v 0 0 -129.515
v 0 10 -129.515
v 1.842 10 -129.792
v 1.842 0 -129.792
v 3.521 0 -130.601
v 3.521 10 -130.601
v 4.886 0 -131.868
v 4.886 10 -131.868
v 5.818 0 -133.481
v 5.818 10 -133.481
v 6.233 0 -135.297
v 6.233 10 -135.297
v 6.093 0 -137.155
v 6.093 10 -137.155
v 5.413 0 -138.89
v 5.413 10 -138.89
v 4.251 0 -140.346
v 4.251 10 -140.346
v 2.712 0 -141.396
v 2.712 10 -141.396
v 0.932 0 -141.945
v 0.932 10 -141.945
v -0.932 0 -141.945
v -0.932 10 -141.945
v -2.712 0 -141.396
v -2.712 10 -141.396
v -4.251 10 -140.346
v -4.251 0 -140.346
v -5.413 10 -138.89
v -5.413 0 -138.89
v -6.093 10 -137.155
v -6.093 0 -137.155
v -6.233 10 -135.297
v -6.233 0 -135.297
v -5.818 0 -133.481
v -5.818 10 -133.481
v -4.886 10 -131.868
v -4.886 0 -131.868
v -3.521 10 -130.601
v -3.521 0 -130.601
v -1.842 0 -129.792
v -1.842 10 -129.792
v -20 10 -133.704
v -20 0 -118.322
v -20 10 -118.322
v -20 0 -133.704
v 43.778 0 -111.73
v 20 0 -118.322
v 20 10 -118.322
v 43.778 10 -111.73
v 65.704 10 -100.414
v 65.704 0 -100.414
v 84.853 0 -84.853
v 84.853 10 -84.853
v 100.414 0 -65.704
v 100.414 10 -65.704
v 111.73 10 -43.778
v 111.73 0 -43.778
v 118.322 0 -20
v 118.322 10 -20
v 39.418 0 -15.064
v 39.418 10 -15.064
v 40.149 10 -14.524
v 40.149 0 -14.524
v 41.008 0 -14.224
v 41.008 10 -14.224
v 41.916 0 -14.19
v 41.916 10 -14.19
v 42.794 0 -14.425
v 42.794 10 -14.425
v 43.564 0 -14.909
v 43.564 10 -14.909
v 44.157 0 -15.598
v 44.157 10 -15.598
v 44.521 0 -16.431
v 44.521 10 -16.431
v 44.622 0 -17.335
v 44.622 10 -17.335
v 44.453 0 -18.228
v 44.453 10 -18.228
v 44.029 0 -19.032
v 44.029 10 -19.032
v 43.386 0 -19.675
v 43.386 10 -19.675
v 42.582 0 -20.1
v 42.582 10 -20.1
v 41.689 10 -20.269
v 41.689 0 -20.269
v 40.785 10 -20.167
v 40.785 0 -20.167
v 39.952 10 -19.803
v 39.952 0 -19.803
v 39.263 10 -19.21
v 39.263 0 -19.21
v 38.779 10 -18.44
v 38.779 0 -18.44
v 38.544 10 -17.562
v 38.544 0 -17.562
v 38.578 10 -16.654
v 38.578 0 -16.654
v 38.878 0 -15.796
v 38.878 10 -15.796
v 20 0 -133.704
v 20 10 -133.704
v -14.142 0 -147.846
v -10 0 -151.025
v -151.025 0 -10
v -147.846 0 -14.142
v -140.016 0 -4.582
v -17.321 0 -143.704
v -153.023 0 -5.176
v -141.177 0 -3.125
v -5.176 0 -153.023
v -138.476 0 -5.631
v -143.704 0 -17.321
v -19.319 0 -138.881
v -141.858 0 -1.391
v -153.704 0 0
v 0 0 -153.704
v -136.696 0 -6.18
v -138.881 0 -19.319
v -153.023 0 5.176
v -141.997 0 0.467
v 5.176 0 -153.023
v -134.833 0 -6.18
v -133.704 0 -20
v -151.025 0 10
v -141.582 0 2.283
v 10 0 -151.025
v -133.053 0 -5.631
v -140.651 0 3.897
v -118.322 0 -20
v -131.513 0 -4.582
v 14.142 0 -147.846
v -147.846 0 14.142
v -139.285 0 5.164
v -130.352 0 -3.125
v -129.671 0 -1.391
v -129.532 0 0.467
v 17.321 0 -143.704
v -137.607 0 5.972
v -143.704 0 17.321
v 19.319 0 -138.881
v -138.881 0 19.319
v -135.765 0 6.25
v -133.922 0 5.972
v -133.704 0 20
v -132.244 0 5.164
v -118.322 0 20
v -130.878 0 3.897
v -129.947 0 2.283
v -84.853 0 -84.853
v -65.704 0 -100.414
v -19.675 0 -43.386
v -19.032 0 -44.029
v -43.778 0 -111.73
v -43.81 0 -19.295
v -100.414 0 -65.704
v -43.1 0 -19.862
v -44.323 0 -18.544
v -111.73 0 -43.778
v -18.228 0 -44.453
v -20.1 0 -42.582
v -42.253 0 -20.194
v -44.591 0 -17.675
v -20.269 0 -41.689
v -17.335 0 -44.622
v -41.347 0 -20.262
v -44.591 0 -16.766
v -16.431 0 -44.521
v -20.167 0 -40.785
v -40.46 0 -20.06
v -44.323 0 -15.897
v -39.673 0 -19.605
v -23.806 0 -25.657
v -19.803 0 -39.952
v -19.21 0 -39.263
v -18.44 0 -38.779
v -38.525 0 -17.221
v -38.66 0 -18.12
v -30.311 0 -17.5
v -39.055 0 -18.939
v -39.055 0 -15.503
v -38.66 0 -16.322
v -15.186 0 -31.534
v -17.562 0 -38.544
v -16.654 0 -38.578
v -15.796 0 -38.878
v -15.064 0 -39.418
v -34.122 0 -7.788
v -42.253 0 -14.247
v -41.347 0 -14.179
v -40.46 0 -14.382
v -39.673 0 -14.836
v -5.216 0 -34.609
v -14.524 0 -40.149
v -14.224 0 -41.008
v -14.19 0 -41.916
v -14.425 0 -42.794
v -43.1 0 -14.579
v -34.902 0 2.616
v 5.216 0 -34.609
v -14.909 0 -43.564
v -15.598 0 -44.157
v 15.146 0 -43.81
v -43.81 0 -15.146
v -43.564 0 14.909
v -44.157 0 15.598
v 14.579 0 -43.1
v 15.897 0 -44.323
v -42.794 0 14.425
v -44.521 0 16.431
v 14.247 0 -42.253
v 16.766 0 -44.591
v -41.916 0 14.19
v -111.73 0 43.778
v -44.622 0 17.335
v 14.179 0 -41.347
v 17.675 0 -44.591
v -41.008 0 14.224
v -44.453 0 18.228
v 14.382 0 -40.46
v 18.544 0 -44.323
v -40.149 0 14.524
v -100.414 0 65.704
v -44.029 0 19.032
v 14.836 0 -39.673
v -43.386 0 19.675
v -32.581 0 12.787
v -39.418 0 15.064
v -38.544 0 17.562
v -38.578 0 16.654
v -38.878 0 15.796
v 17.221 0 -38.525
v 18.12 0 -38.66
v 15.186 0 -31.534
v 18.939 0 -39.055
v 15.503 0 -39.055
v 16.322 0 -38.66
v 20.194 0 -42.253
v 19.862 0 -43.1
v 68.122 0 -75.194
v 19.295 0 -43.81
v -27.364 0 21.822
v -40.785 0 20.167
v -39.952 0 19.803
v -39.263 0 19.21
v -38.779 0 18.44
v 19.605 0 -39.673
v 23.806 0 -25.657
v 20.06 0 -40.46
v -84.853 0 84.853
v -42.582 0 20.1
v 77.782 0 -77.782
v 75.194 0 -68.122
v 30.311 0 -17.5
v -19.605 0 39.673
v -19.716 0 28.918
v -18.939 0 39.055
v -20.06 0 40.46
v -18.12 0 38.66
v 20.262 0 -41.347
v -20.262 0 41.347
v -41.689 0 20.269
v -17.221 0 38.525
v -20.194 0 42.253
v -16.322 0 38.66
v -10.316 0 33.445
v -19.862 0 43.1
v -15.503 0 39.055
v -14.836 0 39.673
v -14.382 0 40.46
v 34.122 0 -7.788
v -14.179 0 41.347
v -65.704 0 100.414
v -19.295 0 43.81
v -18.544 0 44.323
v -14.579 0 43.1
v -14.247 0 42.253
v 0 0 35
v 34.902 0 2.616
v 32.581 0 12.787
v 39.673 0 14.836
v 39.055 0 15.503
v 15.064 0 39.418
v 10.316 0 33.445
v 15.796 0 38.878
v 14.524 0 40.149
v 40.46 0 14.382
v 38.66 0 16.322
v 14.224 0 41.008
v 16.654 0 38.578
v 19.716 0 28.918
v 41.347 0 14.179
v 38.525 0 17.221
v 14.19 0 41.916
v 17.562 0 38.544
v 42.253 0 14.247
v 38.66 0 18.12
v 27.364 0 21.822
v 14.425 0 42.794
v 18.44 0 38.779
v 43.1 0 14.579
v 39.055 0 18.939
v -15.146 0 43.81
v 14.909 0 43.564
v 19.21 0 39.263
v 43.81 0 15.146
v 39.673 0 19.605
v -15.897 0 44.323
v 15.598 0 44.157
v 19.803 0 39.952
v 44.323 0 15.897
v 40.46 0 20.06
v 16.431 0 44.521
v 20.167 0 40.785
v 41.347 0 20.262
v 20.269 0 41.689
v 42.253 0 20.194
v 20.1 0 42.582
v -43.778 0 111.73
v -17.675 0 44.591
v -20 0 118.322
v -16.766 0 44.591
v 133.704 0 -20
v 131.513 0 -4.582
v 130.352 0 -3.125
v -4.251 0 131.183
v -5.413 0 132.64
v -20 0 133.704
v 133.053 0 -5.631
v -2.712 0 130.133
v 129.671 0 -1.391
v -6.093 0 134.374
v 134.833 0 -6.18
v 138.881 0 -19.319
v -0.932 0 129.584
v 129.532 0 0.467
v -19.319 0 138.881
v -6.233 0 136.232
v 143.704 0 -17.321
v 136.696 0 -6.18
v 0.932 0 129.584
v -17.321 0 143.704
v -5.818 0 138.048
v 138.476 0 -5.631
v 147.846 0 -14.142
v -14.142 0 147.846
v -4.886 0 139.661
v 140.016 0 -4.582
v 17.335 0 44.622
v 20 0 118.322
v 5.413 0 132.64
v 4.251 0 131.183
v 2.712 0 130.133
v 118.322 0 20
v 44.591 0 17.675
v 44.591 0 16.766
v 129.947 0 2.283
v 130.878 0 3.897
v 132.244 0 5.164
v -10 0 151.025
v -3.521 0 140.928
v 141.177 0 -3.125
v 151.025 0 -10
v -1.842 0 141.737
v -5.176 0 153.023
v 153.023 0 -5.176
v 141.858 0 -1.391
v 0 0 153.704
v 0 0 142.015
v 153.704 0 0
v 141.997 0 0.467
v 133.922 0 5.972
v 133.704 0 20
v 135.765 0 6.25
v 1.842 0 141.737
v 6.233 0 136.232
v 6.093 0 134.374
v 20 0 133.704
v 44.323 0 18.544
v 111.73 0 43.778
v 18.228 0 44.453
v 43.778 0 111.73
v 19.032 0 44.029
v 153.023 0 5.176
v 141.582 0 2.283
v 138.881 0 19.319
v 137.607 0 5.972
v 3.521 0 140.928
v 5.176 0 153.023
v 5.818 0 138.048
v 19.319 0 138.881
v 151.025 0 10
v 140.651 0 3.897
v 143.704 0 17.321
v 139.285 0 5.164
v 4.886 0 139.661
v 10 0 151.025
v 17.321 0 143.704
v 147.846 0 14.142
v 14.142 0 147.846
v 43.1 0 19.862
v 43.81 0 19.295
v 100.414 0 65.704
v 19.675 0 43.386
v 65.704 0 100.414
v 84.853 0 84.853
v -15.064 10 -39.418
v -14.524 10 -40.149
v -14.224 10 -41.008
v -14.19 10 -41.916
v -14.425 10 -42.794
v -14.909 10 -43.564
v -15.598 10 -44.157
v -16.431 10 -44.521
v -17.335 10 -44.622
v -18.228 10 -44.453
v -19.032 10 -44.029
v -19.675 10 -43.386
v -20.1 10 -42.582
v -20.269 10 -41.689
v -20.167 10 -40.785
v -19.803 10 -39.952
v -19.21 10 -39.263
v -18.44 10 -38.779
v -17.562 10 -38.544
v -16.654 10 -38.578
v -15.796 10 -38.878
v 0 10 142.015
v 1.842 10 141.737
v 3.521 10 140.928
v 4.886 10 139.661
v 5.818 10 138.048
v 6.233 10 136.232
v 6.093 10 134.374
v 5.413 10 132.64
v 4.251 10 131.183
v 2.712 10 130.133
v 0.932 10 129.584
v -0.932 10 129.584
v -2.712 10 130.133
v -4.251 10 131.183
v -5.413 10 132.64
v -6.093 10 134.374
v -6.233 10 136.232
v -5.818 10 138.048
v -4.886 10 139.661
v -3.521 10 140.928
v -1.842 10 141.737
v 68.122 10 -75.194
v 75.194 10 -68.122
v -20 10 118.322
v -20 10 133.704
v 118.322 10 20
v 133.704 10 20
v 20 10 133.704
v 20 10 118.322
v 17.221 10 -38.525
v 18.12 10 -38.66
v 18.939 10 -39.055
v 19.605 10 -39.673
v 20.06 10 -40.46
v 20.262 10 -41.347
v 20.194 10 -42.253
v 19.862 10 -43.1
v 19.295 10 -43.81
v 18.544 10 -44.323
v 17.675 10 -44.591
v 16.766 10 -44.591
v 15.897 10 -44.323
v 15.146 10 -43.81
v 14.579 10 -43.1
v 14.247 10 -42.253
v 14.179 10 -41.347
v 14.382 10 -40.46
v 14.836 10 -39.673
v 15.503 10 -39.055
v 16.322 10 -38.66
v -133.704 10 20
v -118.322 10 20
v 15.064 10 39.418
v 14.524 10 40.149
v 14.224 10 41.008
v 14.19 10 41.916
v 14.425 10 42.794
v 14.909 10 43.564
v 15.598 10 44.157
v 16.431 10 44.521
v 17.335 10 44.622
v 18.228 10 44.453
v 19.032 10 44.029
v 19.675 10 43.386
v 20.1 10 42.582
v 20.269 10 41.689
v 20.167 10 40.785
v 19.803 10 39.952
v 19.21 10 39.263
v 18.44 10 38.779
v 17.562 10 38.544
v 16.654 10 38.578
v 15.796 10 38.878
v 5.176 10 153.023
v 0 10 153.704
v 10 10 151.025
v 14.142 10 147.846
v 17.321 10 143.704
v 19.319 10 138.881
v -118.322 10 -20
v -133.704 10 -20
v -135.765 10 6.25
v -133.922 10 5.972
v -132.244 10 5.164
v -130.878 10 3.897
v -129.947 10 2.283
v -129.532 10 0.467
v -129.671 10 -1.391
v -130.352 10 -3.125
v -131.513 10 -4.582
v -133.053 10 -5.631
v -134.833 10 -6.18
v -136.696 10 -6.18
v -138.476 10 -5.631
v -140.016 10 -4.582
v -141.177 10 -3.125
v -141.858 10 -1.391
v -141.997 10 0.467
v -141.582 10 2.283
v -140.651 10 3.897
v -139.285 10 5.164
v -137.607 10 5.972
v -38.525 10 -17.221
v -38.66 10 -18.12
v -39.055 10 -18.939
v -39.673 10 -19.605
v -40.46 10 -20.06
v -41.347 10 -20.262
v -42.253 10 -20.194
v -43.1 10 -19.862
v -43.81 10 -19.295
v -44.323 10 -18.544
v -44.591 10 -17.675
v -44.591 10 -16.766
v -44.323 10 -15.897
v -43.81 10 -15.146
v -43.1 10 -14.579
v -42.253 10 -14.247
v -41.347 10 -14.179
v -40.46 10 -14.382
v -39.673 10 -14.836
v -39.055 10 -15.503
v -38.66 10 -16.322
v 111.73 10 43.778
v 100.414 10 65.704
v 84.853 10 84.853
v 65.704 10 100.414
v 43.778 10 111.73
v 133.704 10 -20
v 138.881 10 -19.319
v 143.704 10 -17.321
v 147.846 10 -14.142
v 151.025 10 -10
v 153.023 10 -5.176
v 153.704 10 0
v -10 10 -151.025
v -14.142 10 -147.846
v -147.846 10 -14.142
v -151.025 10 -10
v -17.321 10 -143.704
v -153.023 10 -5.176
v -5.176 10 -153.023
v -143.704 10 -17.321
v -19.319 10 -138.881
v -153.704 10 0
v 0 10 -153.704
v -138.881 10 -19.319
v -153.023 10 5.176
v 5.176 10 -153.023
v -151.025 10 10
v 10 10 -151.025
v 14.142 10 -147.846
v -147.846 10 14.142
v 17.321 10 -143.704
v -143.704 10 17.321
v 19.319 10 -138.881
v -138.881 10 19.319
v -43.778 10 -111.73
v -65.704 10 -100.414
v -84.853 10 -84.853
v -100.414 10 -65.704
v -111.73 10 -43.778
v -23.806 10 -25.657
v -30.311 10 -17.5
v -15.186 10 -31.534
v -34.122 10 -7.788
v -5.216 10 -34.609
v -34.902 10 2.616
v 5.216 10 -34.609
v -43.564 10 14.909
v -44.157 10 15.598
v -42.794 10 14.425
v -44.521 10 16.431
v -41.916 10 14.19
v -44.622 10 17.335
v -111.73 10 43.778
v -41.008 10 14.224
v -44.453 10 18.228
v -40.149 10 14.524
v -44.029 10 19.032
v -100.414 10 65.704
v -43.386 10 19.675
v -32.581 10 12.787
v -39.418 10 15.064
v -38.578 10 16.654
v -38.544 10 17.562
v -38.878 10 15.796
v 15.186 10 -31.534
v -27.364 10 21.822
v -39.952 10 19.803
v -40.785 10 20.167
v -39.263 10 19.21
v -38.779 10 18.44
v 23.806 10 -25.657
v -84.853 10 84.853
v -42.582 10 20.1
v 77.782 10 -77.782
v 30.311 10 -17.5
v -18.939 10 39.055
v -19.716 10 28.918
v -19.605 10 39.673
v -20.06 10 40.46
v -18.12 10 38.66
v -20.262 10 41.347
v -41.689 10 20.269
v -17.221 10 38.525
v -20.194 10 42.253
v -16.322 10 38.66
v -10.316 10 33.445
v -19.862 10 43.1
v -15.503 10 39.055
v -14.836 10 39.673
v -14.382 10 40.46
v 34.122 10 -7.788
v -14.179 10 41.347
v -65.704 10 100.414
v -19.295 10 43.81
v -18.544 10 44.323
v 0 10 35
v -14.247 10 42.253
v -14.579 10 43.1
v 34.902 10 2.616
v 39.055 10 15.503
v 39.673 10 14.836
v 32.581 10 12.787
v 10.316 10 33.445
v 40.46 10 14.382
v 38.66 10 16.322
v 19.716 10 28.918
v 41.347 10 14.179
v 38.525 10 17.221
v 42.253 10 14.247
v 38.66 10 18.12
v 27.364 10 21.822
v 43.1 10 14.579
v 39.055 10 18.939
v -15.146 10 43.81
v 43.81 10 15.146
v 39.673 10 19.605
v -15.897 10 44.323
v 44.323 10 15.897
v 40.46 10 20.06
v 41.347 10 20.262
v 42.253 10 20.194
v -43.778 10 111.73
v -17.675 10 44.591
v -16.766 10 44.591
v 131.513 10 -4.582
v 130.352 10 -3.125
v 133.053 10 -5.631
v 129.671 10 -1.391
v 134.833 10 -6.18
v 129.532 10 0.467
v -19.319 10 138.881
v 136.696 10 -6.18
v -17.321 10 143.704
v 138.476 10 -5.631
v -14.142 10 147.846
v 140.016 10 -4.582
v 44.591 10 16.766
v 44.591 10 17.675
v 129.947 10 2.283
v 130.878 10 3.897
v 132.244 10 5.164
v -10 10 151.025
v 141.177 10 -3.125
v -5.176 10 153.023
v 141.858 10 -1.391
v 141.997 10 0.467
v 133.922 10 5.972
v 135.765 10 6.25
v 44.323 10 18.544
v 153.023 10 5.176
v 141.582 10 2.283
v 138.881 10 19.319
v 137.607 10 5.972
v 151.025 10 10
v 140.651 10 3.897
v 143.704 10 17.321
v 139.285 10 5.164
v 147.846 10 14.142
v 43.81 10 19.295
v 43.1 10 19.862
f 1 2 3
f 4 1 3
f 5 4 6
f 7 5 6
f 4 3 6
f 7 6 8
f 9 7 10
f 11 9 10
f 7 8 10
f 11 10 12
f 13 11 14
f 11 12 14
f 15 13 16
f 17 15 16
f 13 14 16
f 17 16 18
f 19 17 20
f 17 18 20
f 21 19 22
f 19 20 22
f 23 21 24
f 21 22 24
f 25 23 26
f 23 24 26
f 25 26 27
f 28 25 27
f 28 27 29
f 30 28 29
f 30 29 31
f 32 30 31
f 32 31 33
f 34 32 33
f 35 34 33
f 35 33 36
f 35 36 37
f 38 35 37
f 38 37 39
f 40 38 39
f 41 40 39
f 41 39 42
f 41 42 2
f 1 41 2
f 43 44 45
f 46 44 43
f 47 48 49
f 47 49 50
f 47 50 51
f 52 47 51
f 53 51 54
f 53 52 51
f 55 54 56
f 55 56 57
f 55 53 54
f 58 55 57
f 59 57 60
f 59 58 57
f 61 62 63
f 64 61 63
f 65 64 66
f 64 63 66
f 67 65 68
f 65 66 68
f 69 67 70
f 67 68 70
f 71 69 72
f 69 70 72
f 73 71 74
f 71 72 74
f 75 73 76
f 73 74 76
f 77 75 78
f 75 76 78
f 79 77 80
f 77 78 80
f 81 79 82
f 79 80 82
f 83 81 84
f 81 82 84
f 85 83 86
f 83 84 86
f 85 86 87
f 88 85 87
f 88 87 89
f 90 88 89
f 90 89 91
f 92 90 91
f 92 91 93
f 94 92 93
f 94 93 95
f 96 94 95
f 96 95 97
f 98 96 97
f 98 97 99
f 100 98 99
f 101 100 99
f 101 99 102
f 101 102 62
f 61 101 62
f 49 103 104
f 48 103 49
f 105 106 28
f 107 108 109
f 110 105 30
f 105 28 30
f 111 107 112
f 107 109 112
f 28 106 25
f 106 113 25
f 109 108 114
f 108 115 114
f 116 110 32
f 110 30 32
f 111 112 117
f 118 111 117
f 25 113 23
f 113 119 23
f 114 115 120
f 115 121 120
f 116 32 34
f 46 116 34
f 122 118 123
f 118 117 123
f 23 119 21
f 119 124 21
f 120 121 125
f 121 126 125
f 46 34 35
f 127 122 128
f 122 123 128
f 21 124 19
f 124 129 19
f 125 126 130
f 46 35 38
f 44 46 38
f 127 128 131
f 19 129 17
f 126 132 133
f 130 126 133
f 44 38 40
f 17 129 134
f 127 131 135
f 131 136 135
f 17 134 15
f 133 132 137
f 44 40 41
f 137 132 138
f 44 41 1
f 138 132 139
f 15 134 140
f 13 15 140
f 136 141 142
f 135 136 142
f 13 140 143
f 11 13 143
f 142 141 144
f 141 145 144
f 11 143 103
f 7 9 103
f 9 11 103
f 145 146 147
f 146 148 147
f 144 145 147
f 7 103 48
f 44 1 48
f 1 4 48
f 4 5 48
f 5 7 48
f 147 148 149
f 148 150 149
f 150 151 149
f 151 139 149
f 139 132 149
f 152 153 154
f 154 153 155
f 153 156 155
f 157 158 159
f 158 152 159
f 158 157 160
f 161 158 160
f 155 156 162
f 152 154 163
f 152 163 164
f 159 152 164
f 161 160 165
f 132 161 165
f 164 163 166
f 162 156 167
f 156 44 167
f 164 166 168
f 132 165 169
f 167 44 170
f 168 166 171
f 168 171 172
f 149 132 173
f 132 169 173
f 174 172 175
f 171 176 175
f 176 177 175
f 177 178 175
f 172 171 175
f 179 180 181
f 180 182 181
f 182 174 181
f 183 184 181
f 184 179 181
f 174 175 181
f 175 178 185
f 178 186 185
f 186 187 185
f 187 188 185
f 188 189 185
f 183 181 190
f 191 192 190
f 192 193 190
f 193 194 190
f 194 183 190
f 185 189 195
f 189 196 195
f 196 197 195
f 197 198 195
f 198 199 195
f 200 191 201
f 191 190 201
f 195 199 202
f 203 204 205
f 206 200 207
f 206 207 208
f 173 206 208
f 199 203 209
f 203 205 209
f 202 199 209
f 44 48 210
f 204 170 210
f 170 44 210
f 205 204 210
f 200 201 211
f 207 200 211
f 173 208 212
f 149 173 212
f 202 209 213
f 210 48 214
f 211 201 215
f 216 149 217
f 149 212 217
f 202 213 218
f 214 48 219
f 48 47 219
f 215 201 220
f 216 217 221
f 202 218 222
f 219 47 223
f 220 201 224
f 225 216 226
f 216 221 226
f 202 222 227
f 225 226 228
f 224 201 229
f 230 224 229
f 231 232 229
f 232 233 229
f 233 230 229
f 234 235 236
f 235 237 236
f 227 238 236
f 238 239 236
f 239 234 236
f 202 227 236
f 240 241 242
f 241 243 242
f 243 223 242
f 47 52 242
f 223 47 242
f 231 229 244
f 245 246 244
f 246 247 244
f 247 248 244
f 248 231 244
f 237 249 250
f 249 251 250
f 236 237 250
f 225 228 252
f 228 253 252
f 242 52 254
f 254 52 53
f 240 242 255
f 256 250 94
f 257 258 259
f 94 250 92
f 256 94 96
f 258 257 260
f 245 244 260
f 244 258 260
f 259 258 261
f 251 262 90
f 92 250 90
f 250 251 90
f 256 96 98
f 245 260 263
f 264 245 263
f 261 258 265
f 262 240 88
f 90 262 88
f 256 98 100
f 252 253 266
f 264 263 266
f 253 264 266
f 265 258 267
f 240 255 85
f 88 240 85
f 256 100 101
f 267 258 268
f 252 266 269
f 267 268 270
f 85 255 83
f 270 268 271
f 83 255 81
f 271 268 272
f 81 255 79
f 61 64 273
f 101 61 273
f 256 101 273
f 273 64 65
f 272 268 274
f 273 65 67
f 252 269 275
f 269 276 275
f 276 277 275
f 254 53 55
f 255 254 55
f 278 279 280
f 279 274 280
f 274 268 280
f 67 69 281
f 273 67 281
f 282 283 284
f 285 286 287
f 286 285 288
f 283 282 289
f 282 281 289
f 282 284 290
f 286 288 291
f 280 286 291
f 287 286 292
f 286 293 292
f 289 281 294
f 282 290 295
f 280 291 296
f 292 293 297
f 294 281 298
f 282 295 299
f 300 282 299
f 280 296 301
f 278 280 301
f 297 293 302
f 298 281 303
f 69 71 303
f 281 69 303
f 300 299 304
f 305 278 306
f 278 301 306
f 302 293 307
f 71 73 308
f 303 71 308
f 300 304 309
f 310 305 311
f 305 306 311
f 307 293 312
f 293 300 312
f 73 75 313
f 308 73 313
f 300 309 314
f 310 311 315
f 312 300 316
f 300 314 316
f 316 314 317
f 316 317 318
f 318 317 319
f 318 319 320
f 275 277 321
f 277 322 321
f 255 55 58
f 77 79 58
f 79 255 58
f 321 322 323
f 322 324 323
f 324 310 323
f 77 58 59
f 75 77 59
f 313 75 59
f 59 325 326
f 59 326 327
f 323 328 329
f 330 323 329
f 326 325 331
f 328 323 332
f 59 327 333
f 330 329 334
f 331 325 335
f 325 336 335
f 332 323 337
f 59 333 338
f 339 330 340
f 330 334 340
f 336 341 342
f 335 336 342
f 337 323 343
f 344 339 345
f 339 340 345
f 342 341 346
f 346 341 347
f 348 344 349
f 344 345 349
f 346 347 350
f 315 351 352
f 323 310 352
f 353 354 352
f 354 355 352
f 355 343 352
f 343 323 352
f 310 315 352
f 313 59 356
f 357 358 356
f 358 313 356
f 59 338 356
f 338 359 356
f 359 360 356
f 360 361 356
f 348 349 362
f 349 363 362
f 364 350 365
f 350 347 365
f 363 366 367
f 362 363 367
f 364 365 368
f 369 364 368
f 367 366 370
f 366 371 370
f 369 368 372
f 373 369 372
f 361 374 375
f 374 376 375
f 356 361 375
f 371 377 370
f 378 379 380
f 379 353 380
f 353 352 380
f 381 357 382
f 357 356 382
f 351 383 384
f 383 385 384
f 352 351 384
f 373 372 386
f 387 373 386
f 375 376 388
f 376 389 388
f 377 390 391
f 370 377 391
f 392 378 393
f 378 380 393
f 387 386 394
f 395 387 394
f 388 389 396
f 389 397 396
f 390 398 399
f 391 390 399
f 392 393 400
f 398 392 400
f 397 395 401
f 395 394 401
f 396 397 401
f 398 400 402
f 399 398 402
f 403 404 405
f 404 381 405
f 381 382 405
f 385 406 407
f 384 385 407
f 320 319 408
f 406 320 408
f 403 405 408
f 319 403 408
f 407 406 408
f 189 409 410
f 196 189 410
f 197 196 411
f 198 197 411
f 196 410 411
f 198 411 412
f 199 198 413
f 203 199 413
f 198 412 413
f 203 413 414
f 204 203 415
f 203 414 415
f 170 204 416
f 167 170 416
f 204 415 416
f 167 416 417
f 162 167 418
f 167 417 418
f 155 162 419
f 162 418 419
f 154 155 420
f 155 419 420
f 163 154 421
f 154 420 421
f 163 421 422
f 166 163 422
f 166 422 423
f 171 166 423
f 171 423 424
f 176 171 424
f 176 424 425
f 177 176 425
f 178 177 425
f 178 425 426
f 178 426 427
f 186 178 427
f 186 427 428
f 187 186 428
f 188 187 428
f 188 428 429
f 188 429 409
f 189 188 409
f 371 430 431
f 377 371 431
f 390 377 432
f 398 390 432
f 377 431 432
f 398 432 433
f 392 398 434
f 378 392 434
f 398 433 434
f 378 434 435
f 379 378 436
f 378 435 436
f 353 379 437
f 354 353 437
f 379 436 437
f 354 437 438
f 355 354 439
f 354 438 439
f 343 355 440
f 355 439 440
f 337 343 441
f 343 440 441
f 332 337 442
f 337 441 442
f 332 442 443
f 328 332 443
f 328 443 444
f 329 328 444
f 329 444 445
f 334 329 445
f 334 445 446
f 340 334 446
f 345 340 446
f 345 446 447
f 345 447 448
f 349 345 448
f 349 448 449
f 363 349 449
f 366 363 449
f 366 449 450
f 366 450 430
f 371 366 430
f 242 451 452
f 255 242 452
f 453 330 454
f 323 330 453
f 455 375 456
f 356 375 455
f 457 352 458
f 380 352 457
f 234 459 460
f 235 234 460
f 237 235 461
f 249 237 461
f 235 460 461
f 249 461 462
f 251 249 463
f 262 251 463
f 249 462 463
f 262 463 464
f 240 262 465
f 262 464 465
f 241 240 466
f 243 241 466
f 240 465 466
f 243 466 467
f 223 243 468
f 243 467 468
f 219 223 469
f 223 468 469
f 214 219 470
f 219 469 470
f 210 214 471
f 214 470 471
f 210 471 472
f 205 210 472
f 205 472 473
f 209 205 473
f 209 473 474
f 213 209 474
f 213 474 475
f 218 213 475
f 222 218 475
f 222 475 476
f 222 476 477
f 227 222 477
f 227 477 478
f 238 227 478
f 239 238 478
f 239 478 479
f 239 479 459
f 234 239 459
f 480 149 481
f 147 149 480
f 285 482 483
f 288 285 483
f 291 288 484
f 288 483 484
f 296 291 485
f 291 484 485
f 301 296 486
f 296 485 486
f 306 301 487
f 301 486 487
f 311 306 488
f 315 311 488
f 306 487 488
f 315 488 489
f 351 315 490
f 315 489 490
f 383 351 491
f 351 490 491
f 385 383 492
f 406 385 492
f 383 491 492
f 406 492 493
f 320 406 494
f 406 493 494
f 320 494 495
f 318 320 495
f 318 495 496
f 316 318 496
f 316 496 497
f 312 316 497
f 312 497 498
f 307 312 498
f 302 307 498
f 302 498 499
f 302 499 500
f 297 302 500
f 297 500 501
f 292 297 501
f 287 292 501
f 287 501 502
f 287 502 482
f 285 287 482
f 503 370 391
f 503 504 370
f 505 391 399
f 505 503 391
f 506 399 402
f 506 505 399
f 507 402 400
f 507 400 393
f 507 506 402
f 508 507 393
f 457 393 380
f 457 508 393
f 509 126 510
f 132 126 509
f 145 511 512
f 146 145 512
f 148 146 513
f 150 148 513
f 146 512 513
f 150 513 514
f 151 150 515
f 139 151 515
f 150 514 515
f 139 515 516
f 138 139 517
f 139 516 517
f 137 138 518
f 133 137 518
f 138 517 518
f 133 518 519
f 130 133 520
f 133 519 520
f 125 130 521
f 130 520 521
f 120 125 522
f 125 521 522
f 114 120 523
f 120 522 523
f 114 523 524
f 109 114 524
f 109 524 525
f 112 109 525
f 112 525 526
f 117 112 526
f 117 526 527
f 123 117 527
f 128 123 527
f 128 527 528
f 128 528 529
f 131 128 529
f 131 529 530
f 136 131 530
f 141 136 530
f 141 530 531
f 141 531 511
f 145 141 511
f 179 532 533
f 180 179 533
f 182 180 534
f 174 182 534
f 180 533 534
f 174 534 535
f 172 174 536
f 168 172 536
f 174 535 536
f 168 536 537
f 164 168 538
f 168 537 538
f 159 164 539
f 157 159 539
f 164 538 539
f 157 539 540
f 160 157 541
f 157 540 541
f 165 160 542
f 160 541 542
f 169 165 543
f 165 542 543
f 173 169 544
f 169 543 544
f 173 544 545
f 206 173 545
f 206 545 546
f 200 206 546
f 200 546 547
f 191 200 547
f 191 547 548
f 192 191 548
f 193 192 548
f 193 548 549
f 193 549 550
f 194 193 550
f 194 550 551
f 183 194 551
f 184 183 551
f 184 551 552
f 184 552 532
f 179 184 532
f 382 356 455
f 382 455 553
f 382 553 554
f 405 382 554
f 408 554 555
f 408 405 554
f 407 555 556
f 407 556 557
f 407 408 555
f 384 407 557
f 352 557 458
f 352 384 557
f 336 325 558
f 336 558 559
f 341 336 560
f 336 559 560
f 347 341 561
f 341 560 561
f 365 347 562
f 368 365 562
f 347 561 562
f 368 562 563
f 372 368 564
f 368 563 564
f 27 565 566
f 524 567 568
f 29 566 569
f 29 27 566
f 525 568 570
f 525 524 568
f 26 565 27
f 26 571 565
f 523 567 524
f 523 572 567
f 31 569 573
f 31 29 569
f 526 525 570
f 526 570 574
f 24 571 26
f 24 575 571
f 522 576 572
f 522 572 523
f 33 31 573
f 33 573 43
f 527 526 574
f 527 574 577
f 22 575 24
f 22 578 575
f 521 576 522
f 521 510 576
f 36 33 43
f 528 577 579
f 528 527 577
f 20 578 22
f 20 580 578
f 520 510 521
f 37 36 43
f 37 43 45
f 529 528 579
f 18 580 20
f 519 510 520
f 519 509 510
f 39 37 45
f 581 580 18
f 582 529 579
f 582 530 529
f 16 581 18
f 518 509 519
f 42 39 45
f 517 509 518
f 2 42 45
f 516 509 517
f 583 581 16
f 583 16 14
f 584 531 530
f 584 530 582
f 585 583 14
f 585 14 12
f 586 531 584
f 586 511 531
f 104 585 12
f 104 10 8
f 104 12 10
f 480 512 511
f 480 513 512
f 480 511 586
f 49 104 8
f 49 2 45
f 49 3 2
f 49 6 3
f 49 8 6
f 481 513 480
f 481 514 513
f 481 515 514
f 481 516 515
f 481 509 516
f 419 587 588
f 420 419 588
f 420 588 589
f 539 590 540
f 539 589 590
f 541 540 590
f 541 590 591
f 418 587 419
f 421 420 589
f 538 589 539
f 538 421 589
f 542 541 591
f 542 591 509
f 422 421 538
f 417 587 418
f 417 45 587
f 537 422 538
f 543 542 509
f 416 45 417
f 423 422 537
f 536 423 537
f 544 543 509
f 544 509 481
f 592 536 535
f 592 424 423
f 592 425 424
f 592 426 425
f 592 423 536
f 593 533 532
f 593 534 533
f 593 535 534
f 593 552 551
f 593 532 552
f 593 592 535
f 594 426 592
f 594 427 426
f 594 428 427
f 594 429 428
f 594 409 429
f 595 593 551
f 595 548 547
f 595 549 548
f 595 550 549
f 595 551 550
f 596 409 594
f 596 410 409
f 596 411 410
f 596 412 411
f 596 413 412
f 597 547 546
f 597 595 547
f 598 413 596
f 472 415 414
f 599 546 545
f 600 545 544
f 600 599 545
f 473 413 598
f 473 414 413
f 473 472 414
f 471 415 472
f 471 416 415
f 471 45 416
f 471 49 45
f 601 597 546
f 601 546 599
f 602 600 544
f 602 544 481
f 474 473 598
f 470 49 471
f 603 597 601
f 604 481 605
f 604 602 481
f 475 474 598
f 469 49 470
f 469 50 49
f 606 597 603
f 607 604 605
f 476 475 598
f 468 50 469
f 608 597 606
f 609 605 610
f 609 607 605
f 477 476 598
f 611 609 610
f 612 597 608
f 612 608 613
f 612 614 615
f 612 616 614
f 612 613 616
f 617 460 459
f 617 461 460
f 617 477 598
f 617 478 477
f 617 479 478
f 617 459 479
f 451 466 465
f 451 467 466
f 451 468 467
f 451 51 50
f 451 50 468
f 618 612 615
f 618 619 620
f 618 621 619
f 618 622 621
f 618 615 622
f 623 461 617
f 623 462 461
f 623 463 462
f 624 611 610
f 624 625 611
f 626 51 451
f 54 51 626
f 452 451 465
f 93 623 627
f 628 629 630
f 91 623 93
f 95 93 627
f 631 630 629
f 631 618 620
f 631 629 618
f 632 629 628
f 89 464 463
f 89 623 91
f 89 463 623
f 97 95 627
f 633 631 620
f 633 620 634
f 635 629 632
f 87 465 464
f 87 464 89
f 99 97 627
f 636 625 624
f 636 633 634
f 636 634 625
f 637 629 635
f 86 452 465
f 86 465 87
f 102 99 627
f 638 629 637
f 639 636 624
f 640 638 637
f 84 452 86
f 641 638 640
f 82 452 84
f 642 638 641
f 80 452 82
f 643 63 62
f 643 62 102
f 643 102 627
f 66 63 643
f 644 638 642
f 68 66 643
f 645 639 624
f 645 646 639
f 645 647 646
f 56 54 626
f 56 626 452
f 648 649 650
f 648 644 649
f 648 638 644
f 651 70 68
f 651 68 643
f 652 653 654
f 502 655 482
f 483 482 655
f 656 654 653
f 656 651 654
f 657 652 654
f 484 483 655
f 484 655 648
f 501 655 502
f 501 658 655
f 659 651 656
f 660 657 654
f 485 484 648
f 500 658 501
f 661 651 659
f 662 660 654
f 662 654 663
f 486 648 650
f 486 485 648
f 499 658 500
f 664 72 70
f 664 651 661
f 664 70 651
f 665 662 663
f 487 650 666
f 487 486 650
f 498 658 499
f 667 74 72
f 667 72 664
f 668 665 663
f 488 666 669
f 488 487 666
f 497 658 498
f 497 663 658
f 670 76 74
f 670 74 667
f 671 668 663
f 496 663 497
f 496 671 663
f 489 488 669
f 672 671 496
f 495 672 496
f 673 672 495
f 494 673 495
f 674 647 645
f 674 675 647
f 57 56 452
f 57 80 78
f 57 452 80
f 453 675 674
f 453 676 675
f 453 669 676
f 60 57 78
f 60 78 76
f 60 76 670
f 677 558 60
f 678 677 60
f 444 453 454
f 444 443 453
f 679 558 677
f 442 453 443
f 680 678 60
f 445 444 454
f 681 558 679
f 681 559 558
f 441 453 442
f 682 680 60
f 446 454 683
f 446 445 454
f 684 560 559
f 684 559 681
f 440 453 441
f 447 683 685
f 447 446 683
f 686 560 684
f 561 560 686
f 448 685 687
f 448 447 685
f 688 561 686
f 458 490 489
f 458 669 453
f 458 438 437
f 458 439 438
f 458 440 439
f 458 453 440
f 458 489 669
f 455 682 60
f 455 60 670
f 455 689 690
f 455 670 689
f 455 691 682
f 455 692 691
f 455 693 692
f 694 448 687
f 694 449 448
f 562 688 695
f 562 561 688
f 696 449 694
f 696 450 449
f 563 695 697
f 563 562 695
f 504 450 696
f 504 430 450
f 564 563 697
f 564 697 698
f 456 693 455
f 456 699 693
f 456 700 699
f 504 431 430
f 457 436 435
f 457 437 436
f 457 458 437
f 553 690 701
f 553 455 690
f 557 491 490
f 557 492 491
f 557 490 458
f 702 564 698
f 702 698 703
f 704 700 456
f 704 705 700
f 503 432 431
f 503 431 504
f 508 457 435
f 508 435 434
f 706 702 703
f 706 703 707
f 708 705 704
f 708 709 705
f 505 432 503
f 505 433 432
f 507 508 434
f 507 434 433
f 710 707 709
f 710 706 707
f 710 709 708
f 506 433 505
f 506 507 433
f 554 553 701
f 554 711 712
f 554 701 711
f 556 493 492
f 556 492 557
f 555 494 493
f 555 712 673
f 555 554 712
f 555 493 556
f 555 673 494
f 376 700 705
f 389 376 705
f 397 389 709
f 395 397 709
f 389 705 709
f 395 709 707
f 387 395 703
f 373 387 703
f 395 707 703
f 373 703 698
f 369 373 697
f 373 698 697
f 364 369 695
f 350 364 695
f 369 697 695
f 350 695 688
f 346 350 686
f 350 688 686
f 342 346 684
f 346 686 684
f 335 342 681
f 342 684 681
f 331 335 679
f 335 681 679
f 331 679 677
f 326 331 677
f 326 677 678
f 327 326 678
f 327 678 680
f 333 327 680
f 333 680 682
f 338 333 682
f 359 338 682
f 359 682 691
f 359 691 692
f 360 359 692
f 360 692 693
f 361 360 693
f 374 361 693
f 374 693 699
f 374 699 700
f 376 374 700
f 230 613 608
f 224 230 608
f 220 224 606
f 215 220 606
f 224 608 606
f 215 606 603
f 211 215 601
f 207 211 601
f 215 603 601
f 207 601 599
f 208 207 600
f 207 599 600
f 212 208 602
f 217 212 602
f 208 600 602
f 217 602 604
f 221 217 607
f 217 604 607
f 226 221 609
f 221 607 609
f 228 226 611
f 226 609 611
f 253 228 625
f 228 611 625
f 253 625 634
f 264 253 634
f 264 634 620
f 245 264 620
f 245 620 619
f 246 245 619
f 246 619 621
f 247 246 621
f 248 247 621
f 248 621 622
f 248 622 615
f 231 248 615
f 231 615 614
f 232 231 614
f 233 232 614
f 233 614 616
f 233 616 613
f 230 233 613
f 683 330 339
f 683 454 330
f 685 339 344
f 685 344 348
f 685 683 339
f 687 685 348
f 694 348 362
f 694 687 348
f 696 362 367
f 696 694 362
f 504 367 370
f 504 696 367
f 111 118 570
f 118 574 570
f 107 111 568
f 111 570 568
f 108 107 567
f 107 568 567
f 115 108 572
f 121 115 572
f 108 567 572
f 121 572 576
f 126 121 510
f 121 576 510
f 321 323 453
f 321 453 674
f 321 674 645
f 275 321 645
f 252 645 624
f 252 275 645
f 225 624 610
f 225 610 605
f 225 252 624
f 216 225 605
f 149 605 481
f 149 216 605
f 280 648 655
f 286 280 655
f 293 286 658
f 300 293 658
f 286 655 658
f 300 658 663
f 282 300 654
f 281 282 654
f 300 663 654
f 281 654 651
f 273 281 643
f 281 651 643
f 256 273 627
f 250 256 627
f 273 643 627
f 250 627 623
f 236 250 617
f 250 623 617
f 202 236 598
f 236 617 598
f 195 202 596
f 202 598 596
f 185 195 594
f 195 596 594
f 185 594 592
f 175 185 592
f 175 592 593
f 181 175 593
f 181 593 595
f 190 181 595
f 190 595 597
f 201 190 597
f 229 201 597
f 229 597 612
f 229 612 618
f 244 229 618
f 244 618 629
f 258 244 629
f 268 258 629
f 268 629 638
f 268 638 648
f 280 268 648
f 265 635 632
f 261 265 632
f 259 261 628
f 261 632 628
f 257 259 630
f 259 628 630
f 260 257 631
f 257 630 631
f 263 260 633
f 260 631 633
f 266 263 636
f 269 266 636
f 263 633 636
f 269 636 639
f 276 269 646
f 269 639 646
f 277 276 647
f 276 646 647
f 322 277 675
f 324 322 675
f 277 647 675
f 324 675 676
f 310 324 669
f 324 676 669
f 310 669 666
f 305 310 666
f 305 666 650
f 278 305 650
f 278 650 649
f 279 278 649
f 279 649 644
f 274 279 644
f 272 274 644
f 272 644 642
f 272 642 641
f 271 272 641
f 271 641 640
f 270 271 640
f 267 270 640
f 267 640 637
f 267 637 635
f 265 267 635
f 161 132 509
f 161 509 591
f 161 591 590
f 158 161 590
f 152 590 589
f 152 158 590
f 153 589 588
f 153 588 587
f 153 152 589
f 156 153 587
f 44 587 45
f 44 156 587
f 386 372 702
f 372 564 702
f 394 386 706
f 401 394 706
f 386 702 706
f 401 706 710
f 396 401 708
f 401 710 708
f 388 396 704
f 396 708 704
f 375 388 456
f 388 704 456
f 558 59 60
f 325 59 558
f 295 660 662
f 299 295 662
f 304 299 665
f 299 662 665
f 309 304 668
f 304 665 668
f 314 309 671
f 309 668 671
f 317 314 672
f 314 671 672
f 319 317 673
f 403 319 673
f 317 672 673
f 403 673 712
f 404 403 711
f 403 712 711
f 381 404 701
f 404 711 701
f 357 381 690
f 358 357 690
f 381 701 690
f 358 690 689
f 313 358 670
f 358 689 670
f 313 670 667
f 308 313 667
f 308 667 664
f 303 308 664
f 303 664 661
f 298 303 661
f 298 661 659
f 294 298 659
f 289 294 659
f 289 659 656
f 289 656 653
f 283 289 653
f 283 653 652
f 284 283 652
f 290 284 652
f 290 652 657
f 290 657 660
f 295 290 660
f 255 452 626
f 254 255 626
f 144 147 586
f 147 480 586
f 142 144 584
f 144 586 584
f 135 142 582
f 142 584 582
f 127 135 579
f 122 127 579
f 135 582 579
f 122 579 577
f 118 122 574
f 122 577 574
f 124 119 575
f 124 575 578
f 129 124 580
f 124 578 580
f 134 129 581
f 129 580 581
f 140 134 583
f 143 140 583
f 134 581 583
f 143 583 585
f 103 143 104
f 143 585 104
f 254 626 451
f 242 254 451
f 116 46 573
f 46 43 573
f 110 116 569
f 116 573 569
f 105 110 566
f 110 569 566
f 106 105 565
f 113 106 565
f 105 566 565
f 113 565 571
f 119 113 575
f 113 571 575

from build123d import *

# Parameters (mm, degrees)
SKETCH1_R           = 155
BOSS_EXTRUDE1_DEPTH = 10
SKETCH2_R           = 6.25
CUT_EXTRUDE1_DEPTH  = 220.431082575
SKETCH3_R           = 35
CUT_EXTRUDE2_DEPTH  = 220.431082575
SKETCH4_R           = 3.05
CUT_EXTRUDE3_DEPTH  = 220.431082575
CIRPATTERN1_COUNT   = 8
CUT_EXTRUDE4_START  = -10
CUT_EXTRUDE4_DEPTH  = 10
CIRPATTERN3_COUNT   = 4
FILLET1_R           = 20
CUT_EXTRUDE5_DEPTH  = 218.60055147


with BuildPart() as part:
    # Sketch1 → Boss-Extrude1 (new body)
    with BuildSketch(Plane(origin=(0, 0, 0), x_dir=(1, 0, 0), z_dir=(0, 1, 0))):
        with Locations(Location((0, 0, 0), (0, 0, 270))):
            Circle(SKETCH1_R)
    extrude(amount=BOSS_EXTRUDE1_DEPTH)

    # Sketch2 → Cut-Extrude1 (cut, through all)
    with BuildSketch(Plane(origin=(0, 10, 0), x_dir=(1, 0, 0), z_dir=(0, 1, 0))):
        with Locations(Location((-135.764501988, 0, 0), (0, 0, 270))):
            Circle(SKETCH2_R)
        with Locations(Location((0, -135.764501988, 0), (0, 0, 270))):
            Circle(SKETCH2_R)
        with Locations(Location((135.764501988, 0, 0), (0, 0, 270))):
            Circle(SKETCH2_R)
        with Locations(Location((0, 135.764501988, 0), (0, 0, 270))):
            Circle(SKETCH2_R)
    extrude(amount=-CUT_EXTRUDE1_DEPTH, mode=Mode.SUBTRACT)

    # Sketch3 → Cut-Extrude2 (cut, through all)
    with BuildSketch(Plane(origin=(0, 10, 0), x_dir=(1, 0, 0), z_dir=(0, 1, 0))):
        with Locations(Location((0, 0, 0), (0, 0, 270))):
            Circle(SKETCH3_R)
    extrude(amount=-CUT_EXTRUDE2_DEPTH, mode=Mode.SUBTRACT)

    # Sketch4 → Cut-Extrude3 (cut, through all)
    with BuildSketch(Plane(origin=(0, 10, 0), x_dir=(1, 0, 0), z_dir=(0, 1, 0))):
        with Locations(Location((17.220754456, 41.574578963, 0), (0, 0, 270))):
            Circle(SKETCH4_R)
    cut_extrude3 = extrude(amount=-CUT_EXTRUDE3_DEPTH, mode=Mode.SUBTRACT)

    # CirPattern1: Cut-Extrude3 ×8 about axis
    cirpattern1_axis = Axis((0, 0, 0), (0, 1, 0))
    for i in range(1, CIRPATTERN1_COUNT):
        add(cut_extrude3.rotate(cirpattern1_axis, i * 360 / CIRPATTERN1_COUNT), mode=Mode.SUBTRACT)

    # Sketch5 → Cut-Extrude4 (cut)
    with BuildSketch(Plane(origin=(0, 10, 0), x_dir=(1, 0, 0), z_dir=(0, 1, 0)).offset(CUT_EXTRUDE4_START)):
        with BuildLine():
            Line((-153.704261489, 20), (-118.321595662, 20))
            ThreePointArc((-118.321595662, 20), (-84.852813742, 84.852813742), (-20, 118.321595662))
            Line((-20, 118.321595662), (-20, 153.704261489))
            ThreePointArc((-20, 153.704261489), (-109.601551084, 109.601551084), (-153.704261489, 20))
        make_face()
        with BuildLine():
            Line((-153.704261489, -20), (-153.704261489, 20))
            ThreePointArc((-153.704261489, 20), (-155, 0), (-153.704261489, -20))
        make_face()
    cut_extrude4 = extrude(amount=CUT_EXTRUDE4_DEPTH, mode=Mode.SUBTRACT)

    # CirPattern3: Cut-Extrude4 ×4 about axis
    cirpattern3_axis = Axis((0, 0, 0), (0, 1, 0))
    for i in range(1, CIRPATTERN3_COUNT):
        add(cut_extrude4.rotate(cirpattern3_axis, i * 360 / CIRPATTERN3_COUNT), mode=Mode.SUBTRACT)

    # Fillet1
    fillet1_edges = [part.edges().sort_by_distance(p)[0] for p in [
        (-153.704261489, 5, -20),
        (-20, 5, 153.704261489),
        (153.704261489, 5, 20),
        (20, 5, -153.704261489),
        (-153.704261489, 5, 20),
        (20, 5, 153.704261489),
        (153.704261489, 5, -20),
        (-20, 5, -153.704261489),
    ]]
    fillet(fillet1_edges, radius=FILLET1_R - 0.0001)  # a hair under: the kernel refuses the full size

    # Sketch6 → Cut-Extrude5 (cut, through all)
    with BuildSketch(Plane(origin=(0, 10, 0), x_dir=(1, 0, 0), z_dir=(0, 1, 0))):
        Polygon((77.781745931, 77.781745931), (68.122487668, 75.193555479), (75.193555479, 68.122487668), align=None)
    extrude(amount=-CUT_EXTRUDE5_DEPTH, mode=Mode.SUBTRACT)


solid = part.part
